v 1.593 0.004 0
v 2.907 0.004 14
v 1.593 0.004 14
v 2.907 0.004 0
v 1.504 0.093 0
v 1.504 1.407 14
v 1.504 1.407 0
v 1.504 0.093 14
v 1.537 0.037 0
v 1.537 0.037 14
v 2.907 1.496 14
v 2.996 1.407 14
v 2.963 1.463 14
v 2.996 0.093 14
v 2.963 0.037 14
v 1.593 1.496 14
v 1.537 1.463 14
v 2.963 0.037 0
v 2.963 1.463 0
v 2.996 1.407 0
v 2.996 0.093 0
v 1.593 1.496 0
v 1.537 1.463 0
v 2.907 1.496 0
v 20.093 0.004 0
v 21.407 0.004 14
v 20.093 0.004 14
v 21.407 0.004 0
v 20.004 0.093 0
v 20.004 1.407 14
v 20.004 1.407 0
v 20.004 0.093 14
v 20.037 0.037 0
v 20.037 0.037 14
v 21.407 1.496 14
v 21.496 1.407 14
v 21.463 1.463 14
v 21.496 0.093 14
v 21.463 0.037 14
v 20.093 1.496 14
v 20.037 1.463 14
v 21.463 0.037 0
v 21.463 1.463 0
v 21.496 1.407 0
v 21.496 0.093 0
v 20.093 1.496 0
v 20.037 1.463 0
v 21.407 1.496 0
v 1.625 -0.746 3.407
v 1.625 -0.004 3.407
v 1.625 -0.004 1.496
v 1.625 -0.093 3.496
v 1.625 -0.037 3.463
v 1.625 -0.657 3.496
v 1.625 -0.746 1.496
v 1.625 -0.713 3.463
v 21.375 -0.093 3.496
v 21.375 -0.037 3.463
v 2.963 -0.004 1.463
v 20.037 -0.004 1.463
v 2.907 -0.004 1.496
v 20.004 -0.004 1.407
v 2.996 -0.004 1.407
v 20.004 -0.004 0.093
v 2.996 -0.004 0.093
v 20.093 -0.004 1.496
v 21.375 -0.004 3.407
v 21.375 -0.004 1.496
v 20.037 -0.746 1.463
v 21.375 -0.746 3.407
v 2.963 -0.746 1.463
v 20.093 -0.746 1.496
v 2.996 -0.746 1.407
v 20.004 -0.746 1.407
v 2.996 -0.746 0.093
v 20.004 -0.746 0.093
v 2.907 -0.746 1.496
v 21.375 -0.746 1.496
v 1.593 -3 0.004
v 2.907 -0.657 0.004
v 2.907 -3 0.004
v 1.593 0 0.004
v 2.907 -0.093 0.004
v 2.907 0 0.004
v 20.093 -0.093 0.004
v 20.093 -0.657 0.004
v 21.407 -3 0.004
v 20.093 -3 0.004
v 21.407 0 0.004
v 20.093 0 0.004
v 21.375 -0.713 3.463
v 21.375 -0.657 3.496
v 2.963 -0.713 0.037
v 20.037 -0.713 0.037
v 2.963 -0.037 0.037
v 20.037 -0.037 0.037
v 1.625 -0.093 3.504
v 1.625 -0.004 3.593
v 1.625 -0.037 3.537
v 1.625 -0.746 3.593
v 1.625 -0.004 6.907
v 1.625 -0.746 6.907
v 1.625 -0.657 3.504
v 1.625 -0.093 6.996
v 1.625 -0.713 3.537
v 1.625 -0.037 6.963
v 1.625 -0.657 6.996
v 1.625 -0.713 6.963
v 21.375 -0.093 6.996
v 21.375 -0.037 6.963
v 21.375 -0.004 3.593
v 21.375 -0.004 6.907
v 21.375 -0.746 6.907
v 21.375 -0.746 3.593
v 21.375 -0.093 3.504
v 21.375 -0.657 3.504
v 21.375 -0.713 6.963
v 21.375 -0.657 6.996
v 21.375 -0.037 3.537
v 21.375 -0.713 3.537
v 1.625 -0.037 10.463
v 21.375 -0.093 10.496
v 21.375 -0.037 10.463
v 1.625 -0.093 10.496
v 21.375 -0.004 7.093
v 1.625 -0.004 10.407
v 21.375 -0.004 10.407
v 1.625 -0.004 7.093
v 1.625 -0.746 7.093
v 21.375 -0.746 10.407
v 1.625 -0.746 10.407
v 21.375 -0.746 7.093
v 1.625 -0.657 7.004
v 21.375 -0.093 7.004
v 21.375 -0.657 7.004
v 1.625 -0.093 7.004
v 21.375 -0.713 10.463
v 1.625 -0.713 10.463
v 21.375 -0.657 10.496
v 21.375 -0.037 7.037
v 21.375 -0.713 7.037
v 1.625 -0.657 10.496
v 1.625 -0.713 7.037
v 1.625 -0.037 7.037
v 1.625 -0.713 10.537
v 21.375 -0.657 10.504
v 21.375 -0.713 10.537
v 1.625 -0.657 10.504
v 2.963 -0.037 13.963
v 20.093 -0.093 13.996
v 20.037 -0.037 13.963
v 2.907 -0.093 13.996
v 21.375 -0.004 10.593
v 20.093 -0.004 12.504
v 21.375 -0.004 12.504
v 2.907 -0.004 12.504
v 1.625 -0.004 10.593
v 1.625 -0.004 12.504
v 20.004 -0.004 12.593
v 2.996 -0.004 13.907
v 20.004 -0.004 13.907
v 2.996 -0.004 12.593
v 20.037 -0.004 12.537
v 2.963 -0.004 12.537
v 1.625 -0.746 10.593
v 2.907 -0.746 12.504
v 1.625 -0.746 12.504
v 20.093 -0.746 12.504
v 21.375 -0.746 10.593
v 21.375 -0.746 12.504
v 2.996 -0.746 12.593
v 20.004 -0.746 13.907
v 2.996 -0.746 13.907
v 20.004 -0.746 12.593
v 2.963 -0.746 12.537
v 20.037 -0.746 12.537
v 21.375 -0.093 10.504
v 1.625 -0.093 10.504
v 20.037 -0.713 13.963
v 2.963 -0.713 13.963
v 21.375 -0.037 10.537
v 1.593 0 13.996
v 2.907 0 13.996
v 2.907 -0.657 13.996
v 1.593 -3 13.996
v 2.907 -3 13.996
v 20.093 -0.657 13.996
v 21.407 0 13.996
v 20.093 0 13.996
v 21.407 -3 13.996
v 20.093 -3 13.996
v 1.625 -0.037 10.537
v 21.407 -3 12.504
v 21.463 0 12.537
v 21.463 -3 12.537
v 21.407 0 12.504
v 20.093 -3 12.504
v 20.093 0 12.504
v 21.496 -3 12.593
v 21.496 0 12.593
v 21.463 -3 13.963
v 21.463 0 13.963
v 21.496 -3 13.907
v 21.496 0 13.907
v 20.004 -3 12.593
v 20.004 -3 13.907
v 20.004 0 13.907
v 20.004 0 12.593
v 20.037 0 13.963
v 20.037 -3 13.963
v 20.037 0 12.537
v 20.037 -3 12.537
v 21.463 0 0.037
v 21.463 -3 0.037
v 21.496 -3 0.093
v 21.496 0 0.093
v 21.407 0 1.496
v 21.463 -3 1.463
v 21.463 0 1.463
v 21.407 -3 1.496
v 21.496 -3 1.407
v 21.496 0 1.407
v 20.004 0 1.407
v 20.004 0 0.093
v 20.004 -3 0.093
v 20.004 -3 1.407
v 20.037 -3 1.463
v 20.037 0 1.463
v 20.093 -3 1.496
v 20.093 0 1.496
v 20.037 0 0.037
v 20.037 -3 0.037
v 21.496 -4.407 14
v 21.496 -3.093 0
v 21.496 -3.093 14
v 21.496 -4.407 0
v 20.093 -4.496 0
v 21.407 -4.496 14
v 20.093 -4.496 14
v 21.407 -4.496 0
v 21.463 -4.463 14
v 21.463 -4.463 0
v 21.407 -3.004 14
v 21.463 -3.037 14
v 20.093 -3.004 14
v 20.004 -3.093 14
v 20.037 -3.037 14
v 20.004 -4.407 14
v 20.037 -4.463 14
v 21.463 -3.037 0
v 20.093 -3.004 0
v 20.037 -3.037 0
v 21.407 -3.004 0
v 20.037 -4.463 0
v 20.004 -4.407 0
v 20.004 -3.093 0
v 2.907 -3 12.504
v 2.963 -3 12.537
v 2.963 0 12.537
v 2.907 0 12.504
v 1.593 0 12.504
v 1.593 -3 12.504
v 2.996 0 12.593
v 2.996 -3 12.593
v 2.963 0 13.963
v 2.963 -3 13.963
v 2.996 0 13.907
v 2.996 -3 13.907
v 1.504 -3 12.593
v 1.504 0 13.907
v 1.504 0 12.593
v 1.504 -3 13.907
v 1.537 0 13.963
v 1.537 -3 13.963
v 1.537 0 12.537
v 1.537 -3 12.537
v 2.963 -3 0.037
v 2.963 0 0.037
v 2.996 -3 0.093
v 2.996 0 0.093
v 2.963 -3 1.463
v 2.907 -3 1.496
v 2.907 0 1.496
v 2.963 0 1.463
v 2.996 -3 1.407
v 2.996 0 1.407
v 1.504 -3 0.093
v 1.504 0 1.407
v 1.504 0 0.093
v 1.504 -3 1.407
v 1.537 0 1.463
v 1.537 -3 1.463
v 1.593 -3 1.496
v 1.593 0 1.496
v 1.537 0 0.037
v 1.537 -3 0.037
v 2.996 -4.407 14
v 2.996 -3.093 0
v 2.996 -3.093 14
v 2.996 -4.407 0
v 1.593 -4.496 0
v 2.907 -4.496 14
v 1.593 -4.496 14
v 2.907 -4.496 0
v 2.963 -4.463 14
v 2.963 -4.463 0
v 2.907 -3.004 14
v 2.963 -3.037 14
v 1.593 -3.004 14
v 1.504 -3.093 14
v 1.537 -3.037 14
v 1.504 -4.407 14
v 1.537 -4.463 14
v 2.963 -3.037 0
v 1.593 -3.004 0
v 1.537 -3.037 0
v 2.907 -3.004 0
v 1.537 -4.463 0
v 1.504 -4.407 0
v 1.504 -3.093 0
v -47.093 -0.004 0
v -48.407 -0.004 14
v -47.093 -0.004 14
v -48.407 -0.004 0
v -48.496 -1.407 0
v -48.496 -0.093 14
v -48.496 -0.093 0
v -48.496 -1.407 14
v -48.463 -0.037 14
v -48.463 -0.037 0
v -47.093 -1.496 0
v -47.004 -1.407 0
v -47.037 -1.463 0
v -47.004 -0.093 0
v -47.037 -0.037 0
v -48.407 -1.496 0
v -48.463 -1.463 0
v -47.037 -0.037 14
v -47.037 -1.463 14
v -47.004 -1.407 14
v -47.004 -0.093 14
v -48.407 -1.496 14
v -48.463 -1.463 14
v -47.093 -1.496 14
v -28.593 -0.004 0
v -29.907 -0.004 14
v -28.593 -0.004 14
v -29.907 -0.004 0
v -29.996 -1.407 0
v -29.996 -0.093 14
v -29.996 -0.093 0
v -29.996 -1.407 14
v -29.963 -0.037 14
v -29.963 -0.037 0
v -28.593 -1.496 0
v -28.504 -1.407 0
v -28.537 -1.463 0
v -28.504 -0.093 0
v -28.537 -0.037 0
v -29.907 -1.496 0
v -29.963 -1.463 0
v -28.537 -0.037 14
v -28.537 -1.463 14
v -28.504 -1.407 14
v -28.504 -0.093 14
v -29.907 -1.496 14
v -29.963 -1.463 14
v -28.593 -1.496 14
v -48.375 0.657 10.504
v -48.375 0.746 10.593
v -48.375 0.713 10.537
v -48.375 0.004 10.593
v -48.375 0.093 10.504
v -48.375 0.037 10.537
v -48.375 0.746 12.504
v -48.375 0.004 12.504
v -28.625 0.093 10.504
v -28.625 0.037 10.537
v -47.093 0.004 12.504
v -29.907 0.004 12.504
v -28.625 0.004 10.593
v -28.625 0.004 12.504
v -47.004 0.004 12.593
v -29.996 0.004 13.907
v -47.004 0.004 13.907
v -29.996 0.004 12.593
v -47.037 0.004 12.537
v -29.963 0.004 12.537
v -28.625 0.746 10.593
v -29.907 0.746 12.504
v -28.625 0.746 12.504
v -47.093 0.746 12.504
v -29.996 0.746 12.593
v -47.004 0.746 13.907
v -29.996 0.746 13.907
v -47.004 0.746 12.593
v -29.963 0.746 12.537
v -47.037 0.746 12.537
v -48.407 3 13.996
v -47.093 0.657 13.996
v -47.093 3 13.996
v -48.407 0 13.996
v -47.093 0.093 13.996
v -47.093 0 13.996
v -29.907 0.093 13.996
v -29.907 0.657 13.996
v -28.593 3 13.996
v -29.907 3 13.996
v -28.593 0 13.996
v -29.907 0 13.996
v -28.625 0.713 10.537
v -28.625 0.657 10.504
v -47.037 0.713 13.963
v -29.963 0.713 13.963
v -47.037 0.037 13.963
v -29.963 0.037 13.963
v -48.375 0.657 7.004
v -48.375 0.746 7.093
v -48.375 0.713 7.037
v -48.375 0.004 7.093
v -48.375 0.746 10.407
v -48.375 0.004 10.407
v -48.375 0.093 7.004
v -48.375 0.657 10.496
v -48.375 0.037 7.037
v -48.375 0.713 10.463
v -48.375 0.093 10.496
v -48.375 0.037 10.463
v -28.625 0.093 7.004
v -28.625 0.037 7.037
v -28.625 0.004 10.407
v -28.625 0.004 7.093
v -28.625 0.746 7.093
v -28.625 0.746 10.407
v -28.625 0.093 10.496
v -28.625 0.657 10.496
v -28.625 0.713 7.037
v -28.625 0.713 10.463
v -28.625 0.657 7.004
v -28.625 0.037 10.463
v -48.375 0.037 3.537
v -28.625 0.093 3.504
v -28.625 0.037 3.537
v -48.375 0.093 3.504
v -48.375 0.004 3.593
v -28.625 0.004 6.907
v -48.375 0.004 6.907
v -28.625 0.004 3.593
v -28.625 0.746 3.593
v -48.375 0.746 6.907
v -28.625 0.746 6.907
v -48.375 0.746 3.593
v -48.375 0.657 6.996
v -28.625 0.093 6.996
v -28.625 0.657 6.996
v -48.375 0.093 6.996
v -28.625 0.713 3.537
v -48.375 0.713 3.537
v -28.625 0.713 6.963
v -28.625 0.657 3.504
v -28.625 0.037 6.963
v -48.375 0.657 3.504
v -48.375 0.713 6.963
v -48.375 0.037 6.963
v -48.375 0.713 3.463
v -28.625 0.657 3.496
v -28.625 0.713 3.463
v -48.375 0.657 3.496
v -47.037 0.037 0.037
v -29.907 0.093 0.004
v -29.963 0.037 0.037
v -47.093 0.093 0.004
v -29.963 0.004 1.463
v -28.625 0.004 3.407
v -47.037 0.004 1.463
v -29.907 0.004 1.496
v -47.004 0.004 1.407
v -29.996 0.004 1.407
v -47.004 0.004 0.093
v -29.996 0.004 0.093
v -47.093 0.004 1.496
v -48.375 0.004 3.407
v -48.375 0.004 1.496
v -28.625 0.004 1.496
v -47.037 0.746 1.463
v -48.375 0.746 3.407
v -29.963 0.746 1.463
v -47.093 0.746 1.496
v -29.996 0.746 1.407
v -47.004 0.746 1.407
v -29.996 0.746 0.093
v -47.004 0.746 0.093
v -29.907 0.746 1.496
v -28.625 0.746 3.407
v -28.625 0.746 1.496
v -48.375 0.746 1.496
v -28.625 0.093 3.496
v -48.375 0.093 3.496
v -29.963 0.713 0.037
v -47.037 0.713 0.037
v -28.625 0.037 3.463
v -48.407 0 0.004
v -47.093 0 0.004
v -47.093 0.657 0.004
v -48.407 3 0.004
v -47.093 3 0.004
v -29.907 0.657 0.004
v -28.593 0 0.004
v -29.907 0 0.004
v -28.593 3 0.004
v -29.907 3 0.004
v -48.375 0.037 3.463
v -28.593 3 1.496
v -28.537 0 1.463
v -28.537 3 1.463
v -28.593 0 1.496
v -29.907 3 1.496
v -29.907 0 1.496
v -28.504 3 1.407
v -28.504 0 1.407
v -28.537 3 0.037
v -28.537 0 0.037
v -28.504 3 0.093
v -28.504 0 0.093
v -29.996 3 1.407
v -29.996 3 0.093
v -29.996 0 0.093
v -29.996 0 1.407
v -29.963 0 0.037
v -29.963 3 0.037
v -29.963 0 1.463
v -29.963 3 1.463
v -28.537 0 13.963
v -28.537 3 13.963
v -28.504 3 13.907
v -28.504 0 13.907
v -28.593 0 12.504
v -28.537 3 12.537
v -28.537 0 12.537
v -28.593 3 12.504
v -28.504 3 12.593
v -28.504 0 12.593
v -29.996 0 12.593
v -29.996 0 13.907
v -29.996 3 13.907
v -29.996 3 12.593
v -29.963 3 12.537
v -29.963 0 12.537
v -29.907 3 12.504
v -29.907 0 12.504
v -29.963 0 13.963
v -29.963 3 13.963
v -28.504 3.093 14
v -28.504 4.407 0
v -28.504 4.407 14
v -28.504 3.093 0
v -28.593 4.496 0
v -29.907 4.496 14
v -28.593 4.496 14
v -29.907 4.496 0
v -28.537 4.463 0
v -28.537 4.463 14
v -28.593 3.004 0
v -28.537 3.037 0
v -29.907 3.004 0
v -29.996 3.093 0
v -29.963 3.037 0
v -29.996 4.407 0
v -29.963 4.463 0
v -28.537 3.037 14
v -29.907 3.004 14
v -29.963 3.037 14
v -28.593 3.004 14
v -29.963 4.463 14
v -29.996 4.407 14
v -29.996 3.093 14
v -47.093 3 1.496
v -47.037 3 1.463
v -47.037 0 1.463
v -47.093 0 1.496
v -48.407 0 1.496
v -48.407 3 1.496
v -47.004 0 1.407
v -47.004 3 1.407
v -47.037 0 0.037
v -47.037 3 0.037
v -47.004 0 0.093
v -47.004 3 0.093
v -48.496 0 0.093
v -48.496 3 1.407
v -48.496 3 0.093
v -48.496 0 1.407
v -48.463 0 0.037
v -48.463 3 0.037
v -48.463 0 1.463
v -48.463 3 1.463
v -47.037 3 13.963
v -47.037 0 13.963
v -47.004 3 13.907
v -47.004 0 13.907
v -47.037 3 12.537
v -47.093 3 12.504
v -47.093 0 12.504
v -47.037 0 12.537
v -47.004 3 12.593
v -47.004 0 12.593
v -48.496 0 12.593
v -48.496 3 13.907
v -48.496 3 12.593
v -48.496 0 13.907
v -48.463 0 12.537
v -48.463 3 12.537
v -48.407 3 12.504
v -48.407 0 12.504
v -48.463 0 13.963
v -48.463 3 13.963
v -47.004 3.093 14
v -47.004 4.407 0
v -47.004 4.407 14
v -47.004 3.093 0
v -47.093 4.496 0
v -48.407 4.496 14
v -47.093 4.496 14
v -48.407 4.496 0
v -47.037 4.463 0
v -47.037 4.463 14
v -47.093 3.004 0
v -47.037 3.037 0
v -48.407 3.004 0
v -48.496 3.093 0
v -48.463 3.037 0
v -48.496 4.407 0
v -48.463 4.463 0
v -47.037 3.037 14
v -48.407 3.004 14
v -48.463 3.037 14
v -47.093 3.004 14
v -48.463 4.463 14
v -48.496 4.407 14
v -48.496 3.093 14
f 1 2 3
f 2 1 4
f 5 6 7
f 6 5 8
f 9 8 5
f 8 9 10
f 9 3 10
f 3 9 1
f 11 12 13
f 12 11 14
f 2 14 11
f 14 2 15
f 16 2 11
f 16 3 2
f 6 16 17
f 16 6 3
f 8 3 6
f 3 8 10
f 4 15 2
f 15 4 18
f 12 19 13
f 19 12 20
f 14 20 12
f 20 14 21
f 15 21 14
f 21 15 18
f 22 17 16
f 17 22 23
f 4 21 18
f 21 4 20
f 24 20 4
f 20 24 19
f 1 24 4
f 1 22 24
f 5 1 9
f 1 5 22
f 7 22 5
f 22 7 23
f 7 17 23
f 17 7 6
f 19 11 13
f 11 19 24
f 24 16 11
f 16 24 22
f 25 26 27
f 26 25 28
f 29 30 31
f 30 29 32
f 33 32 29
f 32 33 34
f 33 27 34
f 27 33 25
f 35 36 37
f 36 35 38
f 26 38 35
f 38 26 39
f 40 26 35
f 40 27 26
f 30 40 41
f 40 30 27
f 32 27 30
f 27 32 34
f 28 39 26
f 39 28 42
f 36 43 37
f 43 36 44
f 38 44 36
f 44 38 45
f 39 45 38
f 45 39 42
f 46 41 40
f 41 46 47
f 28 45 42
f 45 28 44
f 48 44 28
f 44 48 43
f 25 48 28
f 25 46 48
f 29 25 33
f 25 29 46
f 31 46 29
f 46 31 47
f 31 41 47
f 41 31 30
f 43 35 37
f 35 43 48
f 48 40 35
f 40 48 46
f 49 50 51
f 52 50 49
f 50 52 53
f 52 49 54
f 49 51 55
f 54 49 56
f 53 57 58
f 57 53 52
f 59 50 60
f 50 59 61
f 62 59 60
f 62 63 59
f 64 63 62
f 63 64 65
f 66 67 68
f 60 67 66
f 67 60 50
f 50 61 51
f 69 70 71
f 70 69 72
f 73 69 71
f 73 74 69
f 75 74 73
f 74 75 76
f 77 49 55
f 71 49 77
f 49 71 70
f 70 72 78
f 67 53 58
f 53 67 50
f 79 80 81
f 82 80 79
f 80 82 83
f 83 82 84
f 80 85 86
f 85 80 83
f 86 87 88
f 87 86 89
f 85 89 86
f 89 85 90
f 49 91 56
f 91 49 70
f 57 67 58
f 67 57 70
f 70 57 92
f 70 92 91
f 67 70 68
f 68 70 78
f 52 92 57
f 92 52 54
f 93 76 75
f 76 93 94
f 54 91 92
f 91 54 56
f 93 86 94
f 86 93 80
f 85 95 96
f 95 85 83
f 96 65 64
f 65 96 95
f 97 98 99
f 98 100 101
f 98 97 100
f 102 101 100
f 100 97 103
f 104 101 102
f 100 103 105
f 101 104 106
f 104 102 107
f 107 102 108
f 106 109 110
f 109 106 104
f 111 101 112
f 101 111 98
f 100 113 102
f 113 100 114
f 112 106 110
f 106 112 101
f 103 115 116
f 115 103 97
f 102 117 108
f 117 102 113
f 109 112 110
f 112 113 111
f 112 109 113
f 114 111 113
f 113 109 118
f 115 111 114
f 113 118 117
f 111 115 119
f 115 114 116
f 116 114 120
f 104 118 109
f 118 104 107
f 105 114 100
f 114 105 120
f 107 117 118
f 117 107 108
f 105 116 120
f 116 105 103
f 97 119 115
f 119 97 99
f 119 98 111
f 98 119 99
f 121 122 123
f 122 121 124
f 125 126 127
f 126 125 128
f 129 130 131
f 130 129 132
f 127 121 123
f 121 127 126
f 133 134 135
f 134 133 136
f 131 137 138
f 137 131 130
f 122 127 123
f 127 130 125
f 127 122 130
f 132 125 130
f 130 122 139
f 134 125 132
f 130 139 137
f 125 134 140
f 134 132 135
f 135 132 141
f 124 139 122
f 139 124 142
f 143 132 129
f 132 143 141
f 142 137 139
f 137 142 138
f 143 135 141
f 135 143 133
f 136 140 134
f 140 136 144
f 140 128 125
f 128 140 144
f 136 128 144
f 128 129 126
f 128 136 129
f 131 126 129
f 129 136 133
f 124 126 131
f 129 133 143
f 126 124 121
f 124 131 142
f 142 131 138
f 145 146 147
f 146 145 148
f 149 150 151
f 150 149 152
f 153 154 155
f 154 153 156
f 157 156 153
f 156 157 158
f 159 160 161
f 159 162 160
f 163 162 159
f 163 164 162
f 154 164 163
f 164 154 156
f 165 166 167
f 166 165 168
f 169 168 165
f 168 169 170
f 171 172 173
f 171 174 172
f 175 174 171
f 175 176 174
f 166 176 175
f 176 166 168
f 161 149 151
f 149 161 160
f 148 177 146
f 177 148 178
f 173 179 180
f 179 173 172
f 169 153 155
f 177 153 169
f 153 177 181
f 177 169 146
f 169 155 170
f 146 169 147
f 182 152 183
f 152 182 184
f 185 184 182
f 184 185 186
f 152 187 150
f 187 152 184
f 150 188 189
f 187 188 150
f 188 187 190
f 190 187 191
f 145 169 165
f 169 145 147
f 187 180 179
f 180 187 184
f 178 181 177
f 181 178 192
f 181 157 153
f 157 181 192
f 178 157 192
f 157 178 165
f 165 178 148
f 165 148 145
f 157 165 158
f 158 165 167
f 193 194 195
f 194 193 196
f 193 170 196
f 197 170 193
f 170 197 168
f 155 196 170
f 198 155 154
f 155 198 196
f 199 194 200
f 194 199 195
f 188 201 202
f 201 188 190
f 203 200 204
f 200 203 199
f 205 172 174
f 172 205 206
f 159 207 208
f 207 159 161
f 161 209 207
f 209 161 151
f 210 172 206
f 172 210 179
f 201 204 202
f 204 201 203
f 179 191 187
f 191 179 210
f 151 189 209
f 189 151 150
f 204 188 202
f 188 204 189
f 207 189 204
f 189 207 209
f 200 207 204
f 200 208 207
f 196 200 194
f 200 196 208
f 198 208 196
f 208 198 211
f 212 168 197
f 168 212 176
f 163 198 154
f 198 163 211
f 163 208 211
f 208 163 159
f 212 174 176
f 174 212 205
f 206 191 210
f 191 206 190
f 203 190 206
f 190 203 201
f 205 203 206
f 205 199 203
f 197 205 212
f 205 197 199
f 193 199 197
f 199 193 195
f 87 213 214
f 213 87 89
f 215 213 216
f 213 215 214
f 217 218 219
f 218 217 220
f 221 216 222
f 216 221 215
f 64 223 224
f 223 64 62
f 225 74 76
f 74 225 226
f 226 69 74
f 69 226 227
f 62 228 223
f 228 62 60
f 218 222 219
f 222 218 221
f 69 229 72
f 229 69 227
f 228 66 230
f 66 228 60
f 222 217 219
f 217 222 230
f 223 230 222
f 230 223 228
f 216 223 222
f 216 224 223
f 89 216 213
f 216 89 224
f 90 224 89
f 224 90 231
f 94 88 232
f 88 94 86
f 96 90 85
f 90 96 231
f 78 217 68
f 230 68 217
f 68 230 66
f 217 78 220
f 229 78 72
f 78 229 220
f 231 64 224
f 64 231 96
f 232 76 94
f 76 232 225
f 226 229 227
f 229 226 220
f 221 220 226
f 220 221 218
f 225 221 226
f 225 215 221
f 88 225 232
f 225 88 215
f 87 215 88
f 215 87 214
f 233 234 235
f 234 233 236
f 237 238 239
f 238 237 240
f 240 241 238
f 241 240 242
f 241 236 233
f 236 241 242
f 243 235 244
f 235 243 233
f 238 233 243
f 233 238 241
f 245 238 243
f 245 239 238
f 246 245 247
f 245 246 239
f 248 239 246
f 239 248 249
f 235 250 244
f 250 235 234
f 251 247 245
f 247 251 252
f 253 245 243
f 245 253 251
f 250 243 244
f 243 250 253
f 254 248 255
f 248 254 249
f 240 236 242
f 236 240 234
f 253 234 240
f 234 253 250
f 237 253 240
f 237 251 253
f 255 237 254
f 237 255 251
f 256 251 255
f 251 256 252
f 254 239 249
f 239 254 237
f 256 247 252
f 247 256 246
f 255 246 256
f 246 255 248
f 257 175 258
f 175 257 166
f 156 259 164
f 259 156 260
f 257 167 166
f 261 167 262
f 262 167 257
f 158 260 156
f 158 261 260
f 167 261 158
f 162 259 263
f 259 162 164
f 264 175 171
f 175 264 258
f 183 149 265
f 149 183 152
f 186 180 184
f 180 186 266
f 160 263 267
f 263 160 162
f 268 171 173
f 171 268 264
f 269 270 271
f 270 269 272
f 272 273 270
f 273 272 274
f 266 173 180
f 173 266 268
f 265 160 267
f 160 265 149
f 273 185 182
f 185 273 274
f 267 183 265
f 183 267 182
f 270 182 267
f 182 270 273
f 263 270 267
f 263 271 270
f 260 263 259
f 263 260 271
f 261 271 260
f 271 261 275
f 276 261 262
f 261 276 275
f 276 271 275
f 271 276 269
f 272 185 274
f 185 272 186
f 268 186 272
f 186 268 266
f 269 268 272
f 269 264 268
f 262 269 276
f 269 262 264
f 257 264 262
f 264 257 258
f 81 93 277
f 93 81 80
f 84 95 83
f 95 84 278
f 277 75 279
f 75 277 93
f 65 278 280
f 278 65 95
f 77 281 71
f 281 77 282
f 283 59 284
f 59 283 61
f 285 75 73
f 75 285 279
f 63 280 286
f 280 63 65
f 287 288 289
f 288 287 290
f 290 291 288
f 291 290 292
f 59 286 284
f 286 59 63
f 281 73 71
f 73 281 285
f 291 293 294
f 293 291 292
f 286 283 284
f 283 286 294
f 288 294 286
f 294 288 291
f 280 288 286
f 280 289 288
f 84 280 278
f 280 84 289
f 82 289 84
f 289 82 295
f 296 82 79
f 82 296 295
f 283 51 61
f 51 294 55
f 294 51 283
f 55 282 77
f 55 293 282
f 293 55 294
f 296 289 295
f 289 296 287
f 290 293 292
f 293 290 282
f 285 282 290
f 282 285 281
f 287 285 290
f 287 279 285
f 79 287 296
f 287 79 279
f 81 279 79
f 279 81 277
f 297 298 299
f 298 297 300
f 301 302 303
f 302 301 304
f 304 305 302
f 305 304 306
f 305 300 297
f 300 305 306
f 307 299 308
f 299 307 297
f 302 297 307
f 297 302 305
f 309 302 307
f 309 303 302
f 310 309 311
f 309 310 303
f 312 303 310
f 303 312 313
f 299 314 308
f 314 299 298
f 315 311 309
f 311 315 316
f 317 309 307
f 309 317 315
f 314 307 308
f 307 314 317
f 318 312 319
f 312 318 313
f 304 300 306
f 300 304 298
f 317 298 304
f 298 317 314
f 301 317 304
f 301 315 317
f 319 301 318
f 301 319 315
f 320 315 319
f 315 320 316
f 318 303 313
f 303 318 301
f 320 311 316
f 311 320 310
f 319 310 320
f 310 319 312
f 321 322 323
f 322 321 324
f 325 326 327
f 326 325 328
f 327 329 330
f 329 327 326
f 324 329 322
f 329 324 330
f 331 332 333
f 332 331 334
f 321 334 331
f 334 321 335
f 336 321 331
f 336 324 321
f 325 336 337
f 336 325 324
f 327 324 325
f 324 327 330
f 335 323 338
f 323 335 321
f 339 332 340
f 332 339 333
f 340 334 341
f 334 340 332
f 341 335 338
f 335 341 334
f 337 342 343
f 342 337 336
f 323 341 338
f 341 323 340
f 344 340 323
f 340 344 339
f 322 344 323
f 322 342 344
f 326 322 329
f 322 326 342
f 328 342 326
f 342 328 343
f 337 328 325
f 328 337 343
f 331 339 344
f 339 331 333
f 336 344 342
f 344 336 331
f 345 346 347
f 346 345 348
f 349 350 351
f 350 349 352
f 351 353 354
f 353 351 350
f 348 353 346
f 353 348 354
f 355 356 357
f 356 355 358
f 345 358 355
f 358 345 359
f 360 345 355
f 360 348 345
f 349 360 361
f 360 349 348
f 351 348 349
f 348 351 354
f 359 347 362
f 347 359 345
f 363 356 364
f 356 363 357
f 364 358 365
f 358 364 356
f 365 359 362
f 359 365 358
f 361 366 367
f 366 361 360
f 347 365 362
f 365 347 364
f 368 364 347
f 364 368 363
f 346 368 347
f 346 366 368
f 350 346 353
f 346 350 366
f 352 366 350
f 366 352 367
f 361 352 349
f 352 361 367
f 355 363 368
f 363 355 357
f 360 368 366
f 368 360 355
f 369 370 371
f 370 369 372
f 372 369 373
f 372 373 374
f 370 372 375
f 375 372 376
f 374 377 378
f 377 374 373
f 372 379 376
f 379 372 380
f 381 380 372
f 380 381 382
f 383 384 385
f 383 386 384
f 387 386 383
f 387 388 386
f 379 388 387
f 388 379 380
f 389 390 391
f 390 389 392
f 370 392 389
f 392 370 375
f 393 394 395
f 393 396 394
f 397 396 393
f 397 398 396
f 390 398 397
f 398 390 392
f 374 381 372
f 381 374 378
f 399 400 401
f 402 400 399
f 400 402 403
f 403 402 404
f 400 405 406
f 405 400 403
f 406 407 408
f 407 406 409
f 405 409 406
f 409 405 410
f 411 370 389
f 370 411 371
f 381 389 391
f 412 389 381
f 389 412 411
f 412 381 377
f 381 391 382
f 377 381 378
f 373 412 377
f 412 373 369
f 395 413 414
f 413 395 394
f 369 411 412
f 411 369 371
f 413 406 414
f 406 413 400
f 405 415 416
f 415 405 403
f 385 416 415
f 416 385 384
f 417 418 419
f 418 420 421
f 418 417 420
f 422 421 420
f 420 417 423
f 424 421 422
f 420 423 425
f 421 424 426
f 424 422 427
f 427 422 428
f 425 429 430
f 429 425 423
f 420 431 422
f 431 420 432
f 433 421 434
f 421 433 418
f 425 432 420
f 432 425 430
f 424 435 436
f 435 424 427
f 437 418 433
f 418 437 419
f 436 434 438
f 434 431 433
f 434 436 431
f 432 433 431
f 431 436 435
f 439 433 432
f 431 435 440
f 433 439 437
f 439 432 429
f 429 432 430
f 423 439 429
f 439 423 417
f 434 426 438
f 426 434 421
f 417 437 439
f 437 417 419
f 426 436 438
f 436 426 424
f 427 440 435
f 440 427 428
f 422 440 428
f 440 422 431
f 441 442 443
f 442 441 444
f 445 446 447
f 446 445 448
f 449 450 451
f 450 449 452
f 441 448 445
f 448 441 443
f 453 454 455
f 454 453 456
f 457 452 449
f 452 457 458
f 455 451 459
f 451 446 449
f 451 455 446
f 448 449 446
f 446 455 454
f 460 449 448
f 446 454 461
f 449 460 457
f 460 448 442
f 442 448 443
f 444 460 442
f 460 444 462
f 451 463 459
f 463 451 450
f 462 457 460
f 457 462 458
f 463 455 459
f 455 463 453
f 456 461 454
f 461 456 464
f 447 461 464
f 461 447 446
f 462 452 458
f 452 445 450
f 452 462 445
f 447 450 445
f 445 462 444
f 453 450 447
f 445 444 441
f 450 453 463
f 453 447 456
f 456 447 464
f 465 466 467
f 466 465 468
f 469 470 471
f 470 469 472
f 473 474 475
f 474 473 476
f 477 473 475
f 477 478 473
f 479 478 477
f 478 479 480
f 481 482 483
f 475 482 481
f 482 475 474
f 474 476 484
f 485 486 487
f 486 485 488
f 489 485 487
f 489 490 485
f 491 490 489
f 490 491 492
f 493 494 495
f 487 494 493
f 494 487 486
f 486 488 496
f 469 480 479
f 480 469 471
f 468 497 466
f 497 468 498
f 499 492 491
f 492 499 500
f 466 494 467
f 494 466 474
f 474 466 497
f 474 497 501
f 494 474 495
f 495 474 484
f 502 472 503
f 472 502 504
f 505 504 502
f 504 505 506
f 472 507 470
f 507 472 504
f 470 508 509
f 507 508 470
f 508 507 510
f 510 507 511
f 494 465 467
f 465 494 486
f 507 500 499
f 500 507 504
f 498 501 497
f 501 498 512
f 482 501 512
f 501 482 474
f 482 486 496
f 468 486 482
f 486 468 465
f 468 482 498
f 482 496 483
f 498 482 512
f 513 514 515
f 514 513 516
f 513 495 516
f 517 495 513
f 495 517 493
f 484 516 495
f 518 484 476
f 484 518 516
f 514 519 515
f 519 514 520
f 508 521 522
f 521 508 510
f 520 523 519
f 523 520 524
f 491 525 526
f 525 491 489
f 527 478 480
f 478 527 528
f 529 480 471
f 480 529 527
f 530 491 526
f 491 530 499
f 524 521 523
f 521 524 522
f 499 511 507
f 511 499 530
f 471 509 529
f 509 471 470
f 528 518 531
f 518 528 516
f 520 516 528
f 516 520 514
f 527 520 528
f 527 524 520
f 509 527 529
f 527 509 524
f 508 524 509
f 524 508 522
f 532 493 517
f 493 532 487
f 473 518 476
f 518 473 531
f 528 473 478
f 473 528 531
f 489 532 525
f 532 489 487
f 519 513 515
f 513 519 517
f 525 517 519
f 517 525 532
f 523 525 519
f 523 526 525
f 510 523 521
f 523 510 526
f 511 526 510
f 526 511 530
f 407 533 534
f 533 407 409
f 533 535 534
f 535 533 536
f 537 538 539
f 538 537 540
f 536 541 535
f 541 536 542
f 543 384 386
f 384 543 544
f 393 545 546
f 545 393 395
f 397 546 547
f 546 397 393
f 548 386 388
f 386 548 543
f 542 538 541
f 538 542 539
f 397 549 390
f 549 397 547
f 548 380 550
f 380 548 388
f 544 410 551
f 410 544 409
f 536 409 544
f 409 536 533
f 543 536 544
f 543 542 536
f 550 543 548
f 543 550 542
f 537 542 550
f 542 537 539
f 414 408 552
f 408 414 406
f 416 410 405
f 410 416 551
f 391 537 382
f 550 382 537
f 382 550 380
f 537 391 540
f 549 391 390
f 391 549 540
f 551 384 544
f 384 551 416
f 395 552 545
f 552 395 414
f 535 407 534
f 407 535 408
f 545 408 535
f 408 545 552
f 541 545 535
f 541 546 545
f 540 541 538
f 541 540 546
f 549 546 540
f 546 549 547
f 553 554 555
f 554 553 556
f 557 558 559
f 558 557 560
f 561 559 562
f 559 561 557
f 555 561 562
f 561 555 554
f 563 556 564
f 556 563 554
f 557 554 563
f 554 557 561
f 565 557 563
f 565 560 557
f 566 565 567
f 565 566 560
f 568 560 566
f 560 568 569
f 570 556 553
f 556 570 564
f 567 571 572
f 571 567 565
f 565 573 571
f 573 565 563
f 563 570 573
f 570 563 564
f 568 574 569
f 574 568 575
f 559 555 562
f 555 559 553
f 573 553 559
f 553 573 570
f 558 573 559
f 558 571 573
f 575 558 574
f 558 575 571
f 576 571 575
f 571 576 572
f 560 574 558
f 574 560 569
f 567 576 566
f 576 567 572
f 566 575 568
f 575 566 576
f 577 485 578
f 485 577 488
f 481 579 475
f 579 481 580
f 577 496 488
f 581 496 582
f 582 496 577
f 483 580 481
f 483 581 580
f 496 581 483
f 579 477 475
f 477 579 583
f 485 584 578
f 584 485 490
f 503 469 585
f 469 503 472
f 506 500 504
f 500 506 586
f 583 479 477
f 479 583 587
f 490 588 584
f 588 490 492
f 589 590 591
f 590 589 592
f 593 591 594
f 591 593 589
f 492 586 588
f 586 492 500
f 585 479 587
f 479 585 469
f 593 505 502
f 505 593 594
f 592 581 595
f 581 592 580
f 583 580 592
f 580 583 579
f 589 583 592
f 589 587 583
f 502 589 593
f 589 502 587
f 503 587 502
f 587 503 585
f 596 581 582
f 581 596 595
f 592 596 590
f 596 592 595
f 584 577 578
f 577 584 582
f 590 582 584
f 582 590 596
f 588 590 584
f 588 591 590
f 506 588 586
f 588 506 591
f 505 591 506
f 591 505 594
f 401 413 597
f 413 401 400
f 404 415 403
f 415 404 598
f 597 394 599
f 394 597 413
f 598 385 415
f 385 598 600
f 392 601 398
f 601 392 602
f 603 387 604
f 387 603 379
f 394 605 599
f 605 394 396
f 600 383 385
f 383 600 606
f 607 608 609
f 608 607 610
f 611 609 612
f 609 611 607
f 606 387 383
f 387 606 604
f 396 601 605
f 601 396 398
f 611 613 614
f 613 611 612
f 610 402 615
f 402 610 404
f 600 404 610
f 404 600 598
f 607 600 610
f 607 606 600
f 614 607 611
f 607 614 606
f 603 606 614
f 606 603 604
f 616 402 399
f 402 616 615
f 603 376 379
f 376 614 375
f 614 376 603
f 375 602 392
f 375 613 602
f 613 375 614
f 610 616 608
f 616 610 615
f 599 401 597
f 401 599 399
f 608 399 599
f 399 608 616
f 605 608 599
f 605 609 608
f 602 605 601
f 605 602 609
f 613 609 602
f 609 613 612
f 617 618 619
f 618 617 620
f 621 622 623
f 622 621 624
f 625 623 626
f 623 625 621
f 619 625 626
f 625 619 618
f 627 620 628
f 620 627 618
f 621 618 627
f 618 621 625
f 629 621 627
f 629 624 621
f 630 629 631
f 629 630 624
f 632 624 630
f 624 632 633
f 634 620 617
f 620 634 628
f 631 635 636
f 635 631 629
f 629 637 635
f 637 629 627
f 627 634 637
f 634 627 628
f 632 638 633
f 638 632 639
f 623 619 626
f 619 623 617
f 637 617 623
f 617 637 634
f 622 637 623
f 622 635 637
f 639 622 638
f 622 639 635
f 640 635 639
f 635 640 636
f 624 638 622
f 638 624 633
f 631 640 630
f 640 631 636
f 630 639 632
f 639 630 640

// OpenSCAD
// file: premade/lumber.scad
include <../defaults.scad>;

module two_by_two(length) {
  lumber(two_by_height, two_by_height, length);
}

module one_by_six(length) {
  lumber(one_by_height, six_by_height, length);
}

module one_by_four(length) {
  lumber(one_by_height, four_by_height, length);
}


lumber_radius=0.125;
module lumber(height, width, length) {
  hull() {
    // front
    four_half_spheres(height, width);

    // back
    translate([width, length, 0])
      rotate([0, 0, 180])
        four_half_spheres(height, width);
  }
}

module four_half_spheres(height, width) {
  translate([lumber_radius, 0, lumber_radius])
    half_sphere();
  translate([width - lumber_radius, 0, height - lumber_radius])
    half_sphere();
  translate([width - lumber_radius, 0, lumber_radius])
    half_sphere();
  translate([lumber_radius, 0, height - lumber_radius])
    half_sphere();
}

module half_sphere() {
  difference() {
    sphere(r=lumber_radius, $fn=12);
    translate([-0.5, -1, -0.5])
      cube(1);
  }
}
// file: panel.scad
include <defaults.scad>;
use <premade/lumber.scad>;

module panel(four_by_count, width, foot_depth=0, cover=false, edge_offset=0, verticals=true, horizontals=true) {
  height = four_by_count * four_by_height;
  final_width=width - (edge_offset*2);

  translate([0, edge_offset, 0])
    frame(height, final_width, foot_depth, verticals, horizontals);

  if (cover) {
    translate([two_by_height, 0, 0])
      cover(four_by_count, width);
  }
}

module cover(four_by_count, width) {
  for(count = [1 : four_by_count])
    translate([0, 0.125, four_by_height * count])
      rotate([0, 90, 0])
        one_by_four(width - 0.25);
}

module frame(height, width, foot_depth, verticals=true, horizontals=true) {
  if (horizontals) {
    final_width = verticals ? width - (two_by_height * 2) : width;
    y_position = verticals ? two_by_height : 0;

    // top 2x2
    translate([0, y_position, height-two_by_height])
      two_by_two(final_width);

    // bottom 2x2
    translate([0, y_position, 0])
      two_by_two(final_width);
  }

  if (verticals) {
    // left 2x2
    translate([0, two_by_height, -foot_depth])
      rotate([90, 0, 0])
        two_by_two(height + foot_depth);

    // right 2x2
    translate([0, width, -foot_depth])
      rotate([90, 0, 0])
        two_by_two(height + foot_depth);
  }
}
// file: defaults.scad
one_by_height=0.75;
two_by_height=1.5;
four_by_height=3.5;
six_by_height=5.5;

foot_depth=8;
exploded_offset=12;

fence_height = 5 * 12;
frame_depth = 20;
frame_height = 4;
// main file
include <defaults.scad>;
use <panel.scad>;

module right_endcap(width, four_by_count, edge_offset) {
  translate([two_by_height, two_by_height, 0]) {
    rotate([0, 0, 270]) {
      panel(four_by_count, width, cover=true, horizontals=false);

      translate([edge_offset, width-two_by_height, 0])
        rotate([0, 0, 90])
          panel(four_by_count, edge_offset);

      translate([edge_offset, 0, 0])
        rotate([0, 0, 90])
          panel(four_by_count, edge_offset);
    }
  }
}

module left_endcap(width, four_by_count, edge_offset) {
  translate([0, 0, four_by_count * four_by_height])
  rotate([180, 0, 0])
    right_endcap(width, four_by_count, edge_offset);
}

right_endcap(20, 4, edge_offset=6);

translate([-50, 0, 0])
  left_endcap(20, 4, edge_offset=6);
